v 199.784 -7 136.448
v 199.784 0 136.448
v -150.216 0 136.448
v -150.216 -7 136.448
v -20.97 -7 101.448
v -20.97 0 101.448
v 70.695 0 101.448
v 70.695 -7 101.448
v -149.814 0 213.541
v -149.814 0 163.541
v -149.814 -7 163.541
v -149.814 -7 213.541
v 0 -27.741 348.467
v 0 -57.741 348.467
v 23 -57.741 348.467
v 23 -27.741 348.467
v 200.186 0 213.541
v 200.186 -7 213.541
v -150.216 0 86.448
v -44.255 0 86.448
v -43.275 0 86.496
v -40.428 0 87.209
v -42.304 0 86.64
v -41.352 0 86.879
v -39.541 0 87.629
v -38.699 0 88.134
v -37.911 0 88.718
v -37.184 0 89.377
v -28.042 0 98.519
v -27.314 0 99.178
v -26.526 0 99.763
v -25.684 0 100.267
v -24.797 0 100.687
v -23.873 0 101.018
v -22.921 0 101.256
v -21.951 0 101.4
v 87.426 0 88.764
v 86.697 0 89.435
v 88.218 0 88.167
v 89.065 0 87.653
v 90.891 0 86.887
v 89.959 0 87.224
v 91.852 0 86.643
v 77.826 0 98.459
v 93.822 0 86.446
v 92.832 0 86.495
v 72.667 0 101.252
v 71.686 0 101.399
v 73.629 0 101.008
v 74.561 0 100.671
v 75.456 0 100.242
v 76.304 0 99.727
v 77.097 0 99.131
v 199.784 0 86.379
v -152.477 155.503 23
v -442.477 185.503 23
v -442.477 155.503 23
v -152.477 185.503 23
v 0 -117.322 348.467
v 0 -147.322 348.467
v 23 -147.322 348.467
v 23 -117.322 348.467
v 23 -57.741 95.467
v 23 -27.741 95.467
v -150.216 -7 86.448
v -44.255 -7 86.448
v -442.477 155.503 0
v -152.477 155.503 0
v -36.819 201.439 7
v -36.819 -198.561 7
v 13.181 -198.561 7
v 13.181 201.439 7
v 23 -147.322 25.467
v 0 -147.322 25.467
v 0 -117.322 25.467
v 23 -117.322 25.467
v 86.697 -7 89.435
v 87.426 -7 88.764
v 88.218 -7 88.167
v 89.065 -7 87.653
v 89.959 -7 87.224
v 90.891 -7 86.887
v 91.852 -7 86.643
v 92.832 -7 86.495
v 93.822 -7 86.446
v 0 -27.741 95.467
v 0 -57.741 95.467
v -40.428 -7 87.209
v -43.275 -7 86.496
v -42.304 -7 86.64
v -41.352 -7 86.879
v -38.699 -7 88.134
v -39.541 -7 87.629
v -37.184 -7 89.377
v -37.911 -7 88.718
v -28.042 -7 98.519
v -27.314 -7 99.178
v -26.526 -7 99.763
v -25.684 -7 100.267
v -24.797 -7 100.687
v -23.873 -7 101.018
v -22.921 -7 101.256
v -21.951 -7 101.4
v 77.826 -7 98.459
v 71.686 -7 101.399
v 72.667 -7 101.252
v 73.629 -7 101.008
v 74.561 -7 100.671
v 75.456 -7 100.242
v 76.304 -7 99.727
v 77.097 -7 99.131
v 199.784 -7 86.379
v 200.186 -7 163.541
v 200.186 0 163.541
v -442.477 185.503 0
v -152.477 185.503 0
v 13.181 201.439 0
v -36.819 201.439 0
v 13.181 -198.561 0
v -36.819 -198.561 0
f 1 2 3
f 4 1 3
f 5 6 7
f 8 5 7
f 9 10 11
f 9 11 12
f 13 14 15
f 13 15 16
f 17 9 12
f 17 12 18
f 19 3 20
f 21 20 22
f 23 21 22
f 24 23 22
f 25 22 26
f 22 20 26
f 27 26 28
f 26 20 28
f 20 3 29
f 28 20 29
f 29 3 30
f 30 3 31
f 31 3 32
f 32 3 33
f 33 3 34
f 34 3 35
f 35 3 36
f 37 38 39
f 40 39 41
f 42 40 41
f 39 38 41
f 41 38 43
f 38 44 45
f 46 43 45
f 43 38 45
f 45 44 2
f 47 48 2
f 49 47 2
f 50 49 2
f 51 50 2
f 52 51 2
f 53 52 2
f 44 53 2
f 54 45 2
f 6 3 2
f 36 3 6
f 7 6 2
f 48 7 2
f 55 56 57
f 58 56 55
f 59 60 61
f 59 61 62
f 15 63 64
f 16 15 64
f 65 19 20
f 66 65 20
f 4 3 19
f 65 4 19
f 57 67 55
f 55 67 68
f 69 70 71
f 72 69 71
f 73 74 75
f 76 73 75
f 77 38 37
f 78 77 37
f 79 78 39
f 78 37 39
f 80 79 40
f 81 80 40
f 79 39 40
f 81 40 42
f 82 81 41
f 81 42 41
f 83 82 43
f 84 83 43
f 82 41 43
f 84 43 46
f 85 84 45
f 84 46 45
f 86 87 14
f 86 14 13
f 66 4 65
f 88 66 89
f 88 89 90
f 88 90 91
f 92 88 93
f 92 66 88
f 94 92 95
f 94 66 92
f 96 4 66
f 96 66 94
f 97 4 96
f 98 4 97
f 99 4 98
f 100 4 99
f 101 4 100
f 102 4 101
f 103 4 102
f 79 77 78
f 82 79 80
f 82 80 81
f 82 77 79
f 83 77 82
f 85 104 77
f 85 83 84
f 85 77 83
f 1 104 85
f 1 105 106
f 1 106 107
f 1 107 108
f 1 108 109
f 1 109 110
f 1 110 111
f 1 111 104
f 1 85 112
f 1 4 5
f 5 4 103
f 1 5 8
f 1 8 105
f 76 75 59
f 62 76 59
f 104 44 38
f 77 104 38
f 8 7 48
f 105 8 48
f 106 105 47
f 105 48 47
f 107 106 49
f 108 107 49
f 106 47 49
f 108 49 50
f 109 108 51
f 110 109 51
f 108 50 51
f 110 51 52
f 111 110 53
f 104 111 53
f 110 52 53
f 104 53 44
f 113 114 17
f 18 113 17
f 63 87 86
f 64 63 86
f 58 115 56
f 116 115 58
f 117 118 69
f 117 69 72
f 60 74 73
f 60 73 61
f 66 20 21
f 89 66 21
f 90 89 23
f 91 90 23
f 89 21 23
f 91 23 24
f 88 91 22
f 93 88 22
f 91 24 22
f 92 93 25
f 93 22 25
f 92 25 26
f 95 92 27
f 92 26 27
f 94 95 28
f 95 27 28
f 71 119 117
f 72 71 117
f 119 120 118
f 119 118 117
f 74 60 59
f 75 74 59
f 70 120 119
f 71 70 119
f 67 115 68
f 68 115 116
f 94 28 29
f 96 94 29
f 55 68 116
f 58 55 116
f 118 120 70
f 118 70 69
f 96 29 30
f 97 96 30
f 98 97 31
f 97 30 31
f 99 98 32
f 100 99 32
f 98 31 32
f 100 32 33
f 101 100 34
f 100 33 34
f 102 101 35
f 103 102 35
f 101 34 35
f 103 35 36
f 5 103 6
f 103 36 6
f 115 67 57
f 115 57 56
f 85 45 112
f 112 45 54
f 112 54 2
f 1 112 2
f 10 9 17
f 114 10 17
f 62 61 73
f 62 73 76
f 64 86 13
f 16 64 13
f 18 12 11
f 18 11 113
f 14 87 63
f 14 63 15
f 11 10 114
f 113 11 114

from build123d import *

# Parameters (mm, degrees)
F0_W     = 50
F0_H     = 400
F1_DEPTH = 7
F2_W     = 350
F2_H     = 50
F3_DEPTH = 7
F4_W     = 290
F4_H     = 30
F5_DEPTH = 23
F6_W     = 30
F6_H     = 253
F7_DEPTH = 23
F6_H_2   = 323


# Not quite as in the source:
# - a feature names something its author has since deleted; it is built from what else it names


with BuildPart() as f1:
    # F0 (on Top) → F1 (new body)
    with BuildSketch(Plane.XY):
        with Locations((-11.8191692954, 1.4386259147)):
            Rectangle(F0_W, F0_H)
    extrude(amount=F1_DEPTH)


with BuildPart() as f3:
    # F2 (on Front) → F3 (new body)
    with BuildSketch(Plane.XZ):
        with Locations((25.1859198511, 188.5405542329)):
            Rectangle(F2_W, F2_H)
    extrude(amount=F3_DEPTH)


with BuildPart() as f3b:
    # F2 (on Front) → F3, piece 2 (new body)
    with BuildSketch(Plane.XZ):
        with BuildLine():
            Line((199.7836618459, 136.4482086897), (-150.2163381541, 136.4482086897))
            Line((-150.2163381541, 136.4482086897), (-150.2163381541, 86.4482086897))
            Line((-150.2163381541, 86.4482086897), (-44.2547228372, 86.4482086897))
            ThreePointArc((-44.2547228372, 86.4482086897), (-40.4278885136, 87.2094133646), (-37.1836550254, 89.3771408778))
            Line((-37.1836550254, 89.3771408778), (-28.0415194017, 98.5192765016))
            ThreePointArc((-28.0415194017, 98.5192765016), (-24.7972859134, 100.6870040148), (-20.9704515898, 101.4482086897))
            Line((-20.9704515898, 101.4482086897), (70.6951992973, 101.4482086897))
            ThreePointArc((70.6951992973, 101.4482086897), (74.5614190603, 100.6705915024), (77.8263510358, 98.4586776385))
            Line((77.8263510358, 98.4586776385), (86.697224144, 89.4350955287))
            ThreePointArc((86.697224144, 89.4350955287), (89.9592474476, 87.2244015816), (93.8220676124, 86.4455664673))
            Line((93.8220676124, 86.4455664673), (199.7836618459, 86.3787230186))
            Line((199.7836618459, 86.3787230186), (199.7836618459, 136.4482086897))
        make_face()
    extrude(amount=F3_DEPTH)


with BuildPart() as f5:
    # F4 (on Top) → F5 (new body)
    with BuildSketch(Plane.XY):
        with Locations((-297.4768000841, 170.5034965277)):
            Rectangle(F4_W, F4_H)
    extrude(amount=F5_DEPTH)


with BuildPart() as f7:
    # F6 (on Right) → F7 (new body)
    with BuildSketch(Plane.YZ):
        with Locations((-42.7408777177, 221.9668109119)):
            Rectangle(F6_W, F6_H)
    extrude(amount=F7_DEPTH)


with BuildPart() as f7b:
    # F6 (on Right) → F7, piece 2 (new body)
    with BuildSketch(Plane.YZ):
        with Locations((-132.3216563463, 186.9668109119)):
            Rectangle(F6_W, F6_H_2)
    extrude(amount=F7_DEPTH)


solid = Compound([f1.part, f3.part, f3b.part, f5.part, f7.part, f7b.part])
